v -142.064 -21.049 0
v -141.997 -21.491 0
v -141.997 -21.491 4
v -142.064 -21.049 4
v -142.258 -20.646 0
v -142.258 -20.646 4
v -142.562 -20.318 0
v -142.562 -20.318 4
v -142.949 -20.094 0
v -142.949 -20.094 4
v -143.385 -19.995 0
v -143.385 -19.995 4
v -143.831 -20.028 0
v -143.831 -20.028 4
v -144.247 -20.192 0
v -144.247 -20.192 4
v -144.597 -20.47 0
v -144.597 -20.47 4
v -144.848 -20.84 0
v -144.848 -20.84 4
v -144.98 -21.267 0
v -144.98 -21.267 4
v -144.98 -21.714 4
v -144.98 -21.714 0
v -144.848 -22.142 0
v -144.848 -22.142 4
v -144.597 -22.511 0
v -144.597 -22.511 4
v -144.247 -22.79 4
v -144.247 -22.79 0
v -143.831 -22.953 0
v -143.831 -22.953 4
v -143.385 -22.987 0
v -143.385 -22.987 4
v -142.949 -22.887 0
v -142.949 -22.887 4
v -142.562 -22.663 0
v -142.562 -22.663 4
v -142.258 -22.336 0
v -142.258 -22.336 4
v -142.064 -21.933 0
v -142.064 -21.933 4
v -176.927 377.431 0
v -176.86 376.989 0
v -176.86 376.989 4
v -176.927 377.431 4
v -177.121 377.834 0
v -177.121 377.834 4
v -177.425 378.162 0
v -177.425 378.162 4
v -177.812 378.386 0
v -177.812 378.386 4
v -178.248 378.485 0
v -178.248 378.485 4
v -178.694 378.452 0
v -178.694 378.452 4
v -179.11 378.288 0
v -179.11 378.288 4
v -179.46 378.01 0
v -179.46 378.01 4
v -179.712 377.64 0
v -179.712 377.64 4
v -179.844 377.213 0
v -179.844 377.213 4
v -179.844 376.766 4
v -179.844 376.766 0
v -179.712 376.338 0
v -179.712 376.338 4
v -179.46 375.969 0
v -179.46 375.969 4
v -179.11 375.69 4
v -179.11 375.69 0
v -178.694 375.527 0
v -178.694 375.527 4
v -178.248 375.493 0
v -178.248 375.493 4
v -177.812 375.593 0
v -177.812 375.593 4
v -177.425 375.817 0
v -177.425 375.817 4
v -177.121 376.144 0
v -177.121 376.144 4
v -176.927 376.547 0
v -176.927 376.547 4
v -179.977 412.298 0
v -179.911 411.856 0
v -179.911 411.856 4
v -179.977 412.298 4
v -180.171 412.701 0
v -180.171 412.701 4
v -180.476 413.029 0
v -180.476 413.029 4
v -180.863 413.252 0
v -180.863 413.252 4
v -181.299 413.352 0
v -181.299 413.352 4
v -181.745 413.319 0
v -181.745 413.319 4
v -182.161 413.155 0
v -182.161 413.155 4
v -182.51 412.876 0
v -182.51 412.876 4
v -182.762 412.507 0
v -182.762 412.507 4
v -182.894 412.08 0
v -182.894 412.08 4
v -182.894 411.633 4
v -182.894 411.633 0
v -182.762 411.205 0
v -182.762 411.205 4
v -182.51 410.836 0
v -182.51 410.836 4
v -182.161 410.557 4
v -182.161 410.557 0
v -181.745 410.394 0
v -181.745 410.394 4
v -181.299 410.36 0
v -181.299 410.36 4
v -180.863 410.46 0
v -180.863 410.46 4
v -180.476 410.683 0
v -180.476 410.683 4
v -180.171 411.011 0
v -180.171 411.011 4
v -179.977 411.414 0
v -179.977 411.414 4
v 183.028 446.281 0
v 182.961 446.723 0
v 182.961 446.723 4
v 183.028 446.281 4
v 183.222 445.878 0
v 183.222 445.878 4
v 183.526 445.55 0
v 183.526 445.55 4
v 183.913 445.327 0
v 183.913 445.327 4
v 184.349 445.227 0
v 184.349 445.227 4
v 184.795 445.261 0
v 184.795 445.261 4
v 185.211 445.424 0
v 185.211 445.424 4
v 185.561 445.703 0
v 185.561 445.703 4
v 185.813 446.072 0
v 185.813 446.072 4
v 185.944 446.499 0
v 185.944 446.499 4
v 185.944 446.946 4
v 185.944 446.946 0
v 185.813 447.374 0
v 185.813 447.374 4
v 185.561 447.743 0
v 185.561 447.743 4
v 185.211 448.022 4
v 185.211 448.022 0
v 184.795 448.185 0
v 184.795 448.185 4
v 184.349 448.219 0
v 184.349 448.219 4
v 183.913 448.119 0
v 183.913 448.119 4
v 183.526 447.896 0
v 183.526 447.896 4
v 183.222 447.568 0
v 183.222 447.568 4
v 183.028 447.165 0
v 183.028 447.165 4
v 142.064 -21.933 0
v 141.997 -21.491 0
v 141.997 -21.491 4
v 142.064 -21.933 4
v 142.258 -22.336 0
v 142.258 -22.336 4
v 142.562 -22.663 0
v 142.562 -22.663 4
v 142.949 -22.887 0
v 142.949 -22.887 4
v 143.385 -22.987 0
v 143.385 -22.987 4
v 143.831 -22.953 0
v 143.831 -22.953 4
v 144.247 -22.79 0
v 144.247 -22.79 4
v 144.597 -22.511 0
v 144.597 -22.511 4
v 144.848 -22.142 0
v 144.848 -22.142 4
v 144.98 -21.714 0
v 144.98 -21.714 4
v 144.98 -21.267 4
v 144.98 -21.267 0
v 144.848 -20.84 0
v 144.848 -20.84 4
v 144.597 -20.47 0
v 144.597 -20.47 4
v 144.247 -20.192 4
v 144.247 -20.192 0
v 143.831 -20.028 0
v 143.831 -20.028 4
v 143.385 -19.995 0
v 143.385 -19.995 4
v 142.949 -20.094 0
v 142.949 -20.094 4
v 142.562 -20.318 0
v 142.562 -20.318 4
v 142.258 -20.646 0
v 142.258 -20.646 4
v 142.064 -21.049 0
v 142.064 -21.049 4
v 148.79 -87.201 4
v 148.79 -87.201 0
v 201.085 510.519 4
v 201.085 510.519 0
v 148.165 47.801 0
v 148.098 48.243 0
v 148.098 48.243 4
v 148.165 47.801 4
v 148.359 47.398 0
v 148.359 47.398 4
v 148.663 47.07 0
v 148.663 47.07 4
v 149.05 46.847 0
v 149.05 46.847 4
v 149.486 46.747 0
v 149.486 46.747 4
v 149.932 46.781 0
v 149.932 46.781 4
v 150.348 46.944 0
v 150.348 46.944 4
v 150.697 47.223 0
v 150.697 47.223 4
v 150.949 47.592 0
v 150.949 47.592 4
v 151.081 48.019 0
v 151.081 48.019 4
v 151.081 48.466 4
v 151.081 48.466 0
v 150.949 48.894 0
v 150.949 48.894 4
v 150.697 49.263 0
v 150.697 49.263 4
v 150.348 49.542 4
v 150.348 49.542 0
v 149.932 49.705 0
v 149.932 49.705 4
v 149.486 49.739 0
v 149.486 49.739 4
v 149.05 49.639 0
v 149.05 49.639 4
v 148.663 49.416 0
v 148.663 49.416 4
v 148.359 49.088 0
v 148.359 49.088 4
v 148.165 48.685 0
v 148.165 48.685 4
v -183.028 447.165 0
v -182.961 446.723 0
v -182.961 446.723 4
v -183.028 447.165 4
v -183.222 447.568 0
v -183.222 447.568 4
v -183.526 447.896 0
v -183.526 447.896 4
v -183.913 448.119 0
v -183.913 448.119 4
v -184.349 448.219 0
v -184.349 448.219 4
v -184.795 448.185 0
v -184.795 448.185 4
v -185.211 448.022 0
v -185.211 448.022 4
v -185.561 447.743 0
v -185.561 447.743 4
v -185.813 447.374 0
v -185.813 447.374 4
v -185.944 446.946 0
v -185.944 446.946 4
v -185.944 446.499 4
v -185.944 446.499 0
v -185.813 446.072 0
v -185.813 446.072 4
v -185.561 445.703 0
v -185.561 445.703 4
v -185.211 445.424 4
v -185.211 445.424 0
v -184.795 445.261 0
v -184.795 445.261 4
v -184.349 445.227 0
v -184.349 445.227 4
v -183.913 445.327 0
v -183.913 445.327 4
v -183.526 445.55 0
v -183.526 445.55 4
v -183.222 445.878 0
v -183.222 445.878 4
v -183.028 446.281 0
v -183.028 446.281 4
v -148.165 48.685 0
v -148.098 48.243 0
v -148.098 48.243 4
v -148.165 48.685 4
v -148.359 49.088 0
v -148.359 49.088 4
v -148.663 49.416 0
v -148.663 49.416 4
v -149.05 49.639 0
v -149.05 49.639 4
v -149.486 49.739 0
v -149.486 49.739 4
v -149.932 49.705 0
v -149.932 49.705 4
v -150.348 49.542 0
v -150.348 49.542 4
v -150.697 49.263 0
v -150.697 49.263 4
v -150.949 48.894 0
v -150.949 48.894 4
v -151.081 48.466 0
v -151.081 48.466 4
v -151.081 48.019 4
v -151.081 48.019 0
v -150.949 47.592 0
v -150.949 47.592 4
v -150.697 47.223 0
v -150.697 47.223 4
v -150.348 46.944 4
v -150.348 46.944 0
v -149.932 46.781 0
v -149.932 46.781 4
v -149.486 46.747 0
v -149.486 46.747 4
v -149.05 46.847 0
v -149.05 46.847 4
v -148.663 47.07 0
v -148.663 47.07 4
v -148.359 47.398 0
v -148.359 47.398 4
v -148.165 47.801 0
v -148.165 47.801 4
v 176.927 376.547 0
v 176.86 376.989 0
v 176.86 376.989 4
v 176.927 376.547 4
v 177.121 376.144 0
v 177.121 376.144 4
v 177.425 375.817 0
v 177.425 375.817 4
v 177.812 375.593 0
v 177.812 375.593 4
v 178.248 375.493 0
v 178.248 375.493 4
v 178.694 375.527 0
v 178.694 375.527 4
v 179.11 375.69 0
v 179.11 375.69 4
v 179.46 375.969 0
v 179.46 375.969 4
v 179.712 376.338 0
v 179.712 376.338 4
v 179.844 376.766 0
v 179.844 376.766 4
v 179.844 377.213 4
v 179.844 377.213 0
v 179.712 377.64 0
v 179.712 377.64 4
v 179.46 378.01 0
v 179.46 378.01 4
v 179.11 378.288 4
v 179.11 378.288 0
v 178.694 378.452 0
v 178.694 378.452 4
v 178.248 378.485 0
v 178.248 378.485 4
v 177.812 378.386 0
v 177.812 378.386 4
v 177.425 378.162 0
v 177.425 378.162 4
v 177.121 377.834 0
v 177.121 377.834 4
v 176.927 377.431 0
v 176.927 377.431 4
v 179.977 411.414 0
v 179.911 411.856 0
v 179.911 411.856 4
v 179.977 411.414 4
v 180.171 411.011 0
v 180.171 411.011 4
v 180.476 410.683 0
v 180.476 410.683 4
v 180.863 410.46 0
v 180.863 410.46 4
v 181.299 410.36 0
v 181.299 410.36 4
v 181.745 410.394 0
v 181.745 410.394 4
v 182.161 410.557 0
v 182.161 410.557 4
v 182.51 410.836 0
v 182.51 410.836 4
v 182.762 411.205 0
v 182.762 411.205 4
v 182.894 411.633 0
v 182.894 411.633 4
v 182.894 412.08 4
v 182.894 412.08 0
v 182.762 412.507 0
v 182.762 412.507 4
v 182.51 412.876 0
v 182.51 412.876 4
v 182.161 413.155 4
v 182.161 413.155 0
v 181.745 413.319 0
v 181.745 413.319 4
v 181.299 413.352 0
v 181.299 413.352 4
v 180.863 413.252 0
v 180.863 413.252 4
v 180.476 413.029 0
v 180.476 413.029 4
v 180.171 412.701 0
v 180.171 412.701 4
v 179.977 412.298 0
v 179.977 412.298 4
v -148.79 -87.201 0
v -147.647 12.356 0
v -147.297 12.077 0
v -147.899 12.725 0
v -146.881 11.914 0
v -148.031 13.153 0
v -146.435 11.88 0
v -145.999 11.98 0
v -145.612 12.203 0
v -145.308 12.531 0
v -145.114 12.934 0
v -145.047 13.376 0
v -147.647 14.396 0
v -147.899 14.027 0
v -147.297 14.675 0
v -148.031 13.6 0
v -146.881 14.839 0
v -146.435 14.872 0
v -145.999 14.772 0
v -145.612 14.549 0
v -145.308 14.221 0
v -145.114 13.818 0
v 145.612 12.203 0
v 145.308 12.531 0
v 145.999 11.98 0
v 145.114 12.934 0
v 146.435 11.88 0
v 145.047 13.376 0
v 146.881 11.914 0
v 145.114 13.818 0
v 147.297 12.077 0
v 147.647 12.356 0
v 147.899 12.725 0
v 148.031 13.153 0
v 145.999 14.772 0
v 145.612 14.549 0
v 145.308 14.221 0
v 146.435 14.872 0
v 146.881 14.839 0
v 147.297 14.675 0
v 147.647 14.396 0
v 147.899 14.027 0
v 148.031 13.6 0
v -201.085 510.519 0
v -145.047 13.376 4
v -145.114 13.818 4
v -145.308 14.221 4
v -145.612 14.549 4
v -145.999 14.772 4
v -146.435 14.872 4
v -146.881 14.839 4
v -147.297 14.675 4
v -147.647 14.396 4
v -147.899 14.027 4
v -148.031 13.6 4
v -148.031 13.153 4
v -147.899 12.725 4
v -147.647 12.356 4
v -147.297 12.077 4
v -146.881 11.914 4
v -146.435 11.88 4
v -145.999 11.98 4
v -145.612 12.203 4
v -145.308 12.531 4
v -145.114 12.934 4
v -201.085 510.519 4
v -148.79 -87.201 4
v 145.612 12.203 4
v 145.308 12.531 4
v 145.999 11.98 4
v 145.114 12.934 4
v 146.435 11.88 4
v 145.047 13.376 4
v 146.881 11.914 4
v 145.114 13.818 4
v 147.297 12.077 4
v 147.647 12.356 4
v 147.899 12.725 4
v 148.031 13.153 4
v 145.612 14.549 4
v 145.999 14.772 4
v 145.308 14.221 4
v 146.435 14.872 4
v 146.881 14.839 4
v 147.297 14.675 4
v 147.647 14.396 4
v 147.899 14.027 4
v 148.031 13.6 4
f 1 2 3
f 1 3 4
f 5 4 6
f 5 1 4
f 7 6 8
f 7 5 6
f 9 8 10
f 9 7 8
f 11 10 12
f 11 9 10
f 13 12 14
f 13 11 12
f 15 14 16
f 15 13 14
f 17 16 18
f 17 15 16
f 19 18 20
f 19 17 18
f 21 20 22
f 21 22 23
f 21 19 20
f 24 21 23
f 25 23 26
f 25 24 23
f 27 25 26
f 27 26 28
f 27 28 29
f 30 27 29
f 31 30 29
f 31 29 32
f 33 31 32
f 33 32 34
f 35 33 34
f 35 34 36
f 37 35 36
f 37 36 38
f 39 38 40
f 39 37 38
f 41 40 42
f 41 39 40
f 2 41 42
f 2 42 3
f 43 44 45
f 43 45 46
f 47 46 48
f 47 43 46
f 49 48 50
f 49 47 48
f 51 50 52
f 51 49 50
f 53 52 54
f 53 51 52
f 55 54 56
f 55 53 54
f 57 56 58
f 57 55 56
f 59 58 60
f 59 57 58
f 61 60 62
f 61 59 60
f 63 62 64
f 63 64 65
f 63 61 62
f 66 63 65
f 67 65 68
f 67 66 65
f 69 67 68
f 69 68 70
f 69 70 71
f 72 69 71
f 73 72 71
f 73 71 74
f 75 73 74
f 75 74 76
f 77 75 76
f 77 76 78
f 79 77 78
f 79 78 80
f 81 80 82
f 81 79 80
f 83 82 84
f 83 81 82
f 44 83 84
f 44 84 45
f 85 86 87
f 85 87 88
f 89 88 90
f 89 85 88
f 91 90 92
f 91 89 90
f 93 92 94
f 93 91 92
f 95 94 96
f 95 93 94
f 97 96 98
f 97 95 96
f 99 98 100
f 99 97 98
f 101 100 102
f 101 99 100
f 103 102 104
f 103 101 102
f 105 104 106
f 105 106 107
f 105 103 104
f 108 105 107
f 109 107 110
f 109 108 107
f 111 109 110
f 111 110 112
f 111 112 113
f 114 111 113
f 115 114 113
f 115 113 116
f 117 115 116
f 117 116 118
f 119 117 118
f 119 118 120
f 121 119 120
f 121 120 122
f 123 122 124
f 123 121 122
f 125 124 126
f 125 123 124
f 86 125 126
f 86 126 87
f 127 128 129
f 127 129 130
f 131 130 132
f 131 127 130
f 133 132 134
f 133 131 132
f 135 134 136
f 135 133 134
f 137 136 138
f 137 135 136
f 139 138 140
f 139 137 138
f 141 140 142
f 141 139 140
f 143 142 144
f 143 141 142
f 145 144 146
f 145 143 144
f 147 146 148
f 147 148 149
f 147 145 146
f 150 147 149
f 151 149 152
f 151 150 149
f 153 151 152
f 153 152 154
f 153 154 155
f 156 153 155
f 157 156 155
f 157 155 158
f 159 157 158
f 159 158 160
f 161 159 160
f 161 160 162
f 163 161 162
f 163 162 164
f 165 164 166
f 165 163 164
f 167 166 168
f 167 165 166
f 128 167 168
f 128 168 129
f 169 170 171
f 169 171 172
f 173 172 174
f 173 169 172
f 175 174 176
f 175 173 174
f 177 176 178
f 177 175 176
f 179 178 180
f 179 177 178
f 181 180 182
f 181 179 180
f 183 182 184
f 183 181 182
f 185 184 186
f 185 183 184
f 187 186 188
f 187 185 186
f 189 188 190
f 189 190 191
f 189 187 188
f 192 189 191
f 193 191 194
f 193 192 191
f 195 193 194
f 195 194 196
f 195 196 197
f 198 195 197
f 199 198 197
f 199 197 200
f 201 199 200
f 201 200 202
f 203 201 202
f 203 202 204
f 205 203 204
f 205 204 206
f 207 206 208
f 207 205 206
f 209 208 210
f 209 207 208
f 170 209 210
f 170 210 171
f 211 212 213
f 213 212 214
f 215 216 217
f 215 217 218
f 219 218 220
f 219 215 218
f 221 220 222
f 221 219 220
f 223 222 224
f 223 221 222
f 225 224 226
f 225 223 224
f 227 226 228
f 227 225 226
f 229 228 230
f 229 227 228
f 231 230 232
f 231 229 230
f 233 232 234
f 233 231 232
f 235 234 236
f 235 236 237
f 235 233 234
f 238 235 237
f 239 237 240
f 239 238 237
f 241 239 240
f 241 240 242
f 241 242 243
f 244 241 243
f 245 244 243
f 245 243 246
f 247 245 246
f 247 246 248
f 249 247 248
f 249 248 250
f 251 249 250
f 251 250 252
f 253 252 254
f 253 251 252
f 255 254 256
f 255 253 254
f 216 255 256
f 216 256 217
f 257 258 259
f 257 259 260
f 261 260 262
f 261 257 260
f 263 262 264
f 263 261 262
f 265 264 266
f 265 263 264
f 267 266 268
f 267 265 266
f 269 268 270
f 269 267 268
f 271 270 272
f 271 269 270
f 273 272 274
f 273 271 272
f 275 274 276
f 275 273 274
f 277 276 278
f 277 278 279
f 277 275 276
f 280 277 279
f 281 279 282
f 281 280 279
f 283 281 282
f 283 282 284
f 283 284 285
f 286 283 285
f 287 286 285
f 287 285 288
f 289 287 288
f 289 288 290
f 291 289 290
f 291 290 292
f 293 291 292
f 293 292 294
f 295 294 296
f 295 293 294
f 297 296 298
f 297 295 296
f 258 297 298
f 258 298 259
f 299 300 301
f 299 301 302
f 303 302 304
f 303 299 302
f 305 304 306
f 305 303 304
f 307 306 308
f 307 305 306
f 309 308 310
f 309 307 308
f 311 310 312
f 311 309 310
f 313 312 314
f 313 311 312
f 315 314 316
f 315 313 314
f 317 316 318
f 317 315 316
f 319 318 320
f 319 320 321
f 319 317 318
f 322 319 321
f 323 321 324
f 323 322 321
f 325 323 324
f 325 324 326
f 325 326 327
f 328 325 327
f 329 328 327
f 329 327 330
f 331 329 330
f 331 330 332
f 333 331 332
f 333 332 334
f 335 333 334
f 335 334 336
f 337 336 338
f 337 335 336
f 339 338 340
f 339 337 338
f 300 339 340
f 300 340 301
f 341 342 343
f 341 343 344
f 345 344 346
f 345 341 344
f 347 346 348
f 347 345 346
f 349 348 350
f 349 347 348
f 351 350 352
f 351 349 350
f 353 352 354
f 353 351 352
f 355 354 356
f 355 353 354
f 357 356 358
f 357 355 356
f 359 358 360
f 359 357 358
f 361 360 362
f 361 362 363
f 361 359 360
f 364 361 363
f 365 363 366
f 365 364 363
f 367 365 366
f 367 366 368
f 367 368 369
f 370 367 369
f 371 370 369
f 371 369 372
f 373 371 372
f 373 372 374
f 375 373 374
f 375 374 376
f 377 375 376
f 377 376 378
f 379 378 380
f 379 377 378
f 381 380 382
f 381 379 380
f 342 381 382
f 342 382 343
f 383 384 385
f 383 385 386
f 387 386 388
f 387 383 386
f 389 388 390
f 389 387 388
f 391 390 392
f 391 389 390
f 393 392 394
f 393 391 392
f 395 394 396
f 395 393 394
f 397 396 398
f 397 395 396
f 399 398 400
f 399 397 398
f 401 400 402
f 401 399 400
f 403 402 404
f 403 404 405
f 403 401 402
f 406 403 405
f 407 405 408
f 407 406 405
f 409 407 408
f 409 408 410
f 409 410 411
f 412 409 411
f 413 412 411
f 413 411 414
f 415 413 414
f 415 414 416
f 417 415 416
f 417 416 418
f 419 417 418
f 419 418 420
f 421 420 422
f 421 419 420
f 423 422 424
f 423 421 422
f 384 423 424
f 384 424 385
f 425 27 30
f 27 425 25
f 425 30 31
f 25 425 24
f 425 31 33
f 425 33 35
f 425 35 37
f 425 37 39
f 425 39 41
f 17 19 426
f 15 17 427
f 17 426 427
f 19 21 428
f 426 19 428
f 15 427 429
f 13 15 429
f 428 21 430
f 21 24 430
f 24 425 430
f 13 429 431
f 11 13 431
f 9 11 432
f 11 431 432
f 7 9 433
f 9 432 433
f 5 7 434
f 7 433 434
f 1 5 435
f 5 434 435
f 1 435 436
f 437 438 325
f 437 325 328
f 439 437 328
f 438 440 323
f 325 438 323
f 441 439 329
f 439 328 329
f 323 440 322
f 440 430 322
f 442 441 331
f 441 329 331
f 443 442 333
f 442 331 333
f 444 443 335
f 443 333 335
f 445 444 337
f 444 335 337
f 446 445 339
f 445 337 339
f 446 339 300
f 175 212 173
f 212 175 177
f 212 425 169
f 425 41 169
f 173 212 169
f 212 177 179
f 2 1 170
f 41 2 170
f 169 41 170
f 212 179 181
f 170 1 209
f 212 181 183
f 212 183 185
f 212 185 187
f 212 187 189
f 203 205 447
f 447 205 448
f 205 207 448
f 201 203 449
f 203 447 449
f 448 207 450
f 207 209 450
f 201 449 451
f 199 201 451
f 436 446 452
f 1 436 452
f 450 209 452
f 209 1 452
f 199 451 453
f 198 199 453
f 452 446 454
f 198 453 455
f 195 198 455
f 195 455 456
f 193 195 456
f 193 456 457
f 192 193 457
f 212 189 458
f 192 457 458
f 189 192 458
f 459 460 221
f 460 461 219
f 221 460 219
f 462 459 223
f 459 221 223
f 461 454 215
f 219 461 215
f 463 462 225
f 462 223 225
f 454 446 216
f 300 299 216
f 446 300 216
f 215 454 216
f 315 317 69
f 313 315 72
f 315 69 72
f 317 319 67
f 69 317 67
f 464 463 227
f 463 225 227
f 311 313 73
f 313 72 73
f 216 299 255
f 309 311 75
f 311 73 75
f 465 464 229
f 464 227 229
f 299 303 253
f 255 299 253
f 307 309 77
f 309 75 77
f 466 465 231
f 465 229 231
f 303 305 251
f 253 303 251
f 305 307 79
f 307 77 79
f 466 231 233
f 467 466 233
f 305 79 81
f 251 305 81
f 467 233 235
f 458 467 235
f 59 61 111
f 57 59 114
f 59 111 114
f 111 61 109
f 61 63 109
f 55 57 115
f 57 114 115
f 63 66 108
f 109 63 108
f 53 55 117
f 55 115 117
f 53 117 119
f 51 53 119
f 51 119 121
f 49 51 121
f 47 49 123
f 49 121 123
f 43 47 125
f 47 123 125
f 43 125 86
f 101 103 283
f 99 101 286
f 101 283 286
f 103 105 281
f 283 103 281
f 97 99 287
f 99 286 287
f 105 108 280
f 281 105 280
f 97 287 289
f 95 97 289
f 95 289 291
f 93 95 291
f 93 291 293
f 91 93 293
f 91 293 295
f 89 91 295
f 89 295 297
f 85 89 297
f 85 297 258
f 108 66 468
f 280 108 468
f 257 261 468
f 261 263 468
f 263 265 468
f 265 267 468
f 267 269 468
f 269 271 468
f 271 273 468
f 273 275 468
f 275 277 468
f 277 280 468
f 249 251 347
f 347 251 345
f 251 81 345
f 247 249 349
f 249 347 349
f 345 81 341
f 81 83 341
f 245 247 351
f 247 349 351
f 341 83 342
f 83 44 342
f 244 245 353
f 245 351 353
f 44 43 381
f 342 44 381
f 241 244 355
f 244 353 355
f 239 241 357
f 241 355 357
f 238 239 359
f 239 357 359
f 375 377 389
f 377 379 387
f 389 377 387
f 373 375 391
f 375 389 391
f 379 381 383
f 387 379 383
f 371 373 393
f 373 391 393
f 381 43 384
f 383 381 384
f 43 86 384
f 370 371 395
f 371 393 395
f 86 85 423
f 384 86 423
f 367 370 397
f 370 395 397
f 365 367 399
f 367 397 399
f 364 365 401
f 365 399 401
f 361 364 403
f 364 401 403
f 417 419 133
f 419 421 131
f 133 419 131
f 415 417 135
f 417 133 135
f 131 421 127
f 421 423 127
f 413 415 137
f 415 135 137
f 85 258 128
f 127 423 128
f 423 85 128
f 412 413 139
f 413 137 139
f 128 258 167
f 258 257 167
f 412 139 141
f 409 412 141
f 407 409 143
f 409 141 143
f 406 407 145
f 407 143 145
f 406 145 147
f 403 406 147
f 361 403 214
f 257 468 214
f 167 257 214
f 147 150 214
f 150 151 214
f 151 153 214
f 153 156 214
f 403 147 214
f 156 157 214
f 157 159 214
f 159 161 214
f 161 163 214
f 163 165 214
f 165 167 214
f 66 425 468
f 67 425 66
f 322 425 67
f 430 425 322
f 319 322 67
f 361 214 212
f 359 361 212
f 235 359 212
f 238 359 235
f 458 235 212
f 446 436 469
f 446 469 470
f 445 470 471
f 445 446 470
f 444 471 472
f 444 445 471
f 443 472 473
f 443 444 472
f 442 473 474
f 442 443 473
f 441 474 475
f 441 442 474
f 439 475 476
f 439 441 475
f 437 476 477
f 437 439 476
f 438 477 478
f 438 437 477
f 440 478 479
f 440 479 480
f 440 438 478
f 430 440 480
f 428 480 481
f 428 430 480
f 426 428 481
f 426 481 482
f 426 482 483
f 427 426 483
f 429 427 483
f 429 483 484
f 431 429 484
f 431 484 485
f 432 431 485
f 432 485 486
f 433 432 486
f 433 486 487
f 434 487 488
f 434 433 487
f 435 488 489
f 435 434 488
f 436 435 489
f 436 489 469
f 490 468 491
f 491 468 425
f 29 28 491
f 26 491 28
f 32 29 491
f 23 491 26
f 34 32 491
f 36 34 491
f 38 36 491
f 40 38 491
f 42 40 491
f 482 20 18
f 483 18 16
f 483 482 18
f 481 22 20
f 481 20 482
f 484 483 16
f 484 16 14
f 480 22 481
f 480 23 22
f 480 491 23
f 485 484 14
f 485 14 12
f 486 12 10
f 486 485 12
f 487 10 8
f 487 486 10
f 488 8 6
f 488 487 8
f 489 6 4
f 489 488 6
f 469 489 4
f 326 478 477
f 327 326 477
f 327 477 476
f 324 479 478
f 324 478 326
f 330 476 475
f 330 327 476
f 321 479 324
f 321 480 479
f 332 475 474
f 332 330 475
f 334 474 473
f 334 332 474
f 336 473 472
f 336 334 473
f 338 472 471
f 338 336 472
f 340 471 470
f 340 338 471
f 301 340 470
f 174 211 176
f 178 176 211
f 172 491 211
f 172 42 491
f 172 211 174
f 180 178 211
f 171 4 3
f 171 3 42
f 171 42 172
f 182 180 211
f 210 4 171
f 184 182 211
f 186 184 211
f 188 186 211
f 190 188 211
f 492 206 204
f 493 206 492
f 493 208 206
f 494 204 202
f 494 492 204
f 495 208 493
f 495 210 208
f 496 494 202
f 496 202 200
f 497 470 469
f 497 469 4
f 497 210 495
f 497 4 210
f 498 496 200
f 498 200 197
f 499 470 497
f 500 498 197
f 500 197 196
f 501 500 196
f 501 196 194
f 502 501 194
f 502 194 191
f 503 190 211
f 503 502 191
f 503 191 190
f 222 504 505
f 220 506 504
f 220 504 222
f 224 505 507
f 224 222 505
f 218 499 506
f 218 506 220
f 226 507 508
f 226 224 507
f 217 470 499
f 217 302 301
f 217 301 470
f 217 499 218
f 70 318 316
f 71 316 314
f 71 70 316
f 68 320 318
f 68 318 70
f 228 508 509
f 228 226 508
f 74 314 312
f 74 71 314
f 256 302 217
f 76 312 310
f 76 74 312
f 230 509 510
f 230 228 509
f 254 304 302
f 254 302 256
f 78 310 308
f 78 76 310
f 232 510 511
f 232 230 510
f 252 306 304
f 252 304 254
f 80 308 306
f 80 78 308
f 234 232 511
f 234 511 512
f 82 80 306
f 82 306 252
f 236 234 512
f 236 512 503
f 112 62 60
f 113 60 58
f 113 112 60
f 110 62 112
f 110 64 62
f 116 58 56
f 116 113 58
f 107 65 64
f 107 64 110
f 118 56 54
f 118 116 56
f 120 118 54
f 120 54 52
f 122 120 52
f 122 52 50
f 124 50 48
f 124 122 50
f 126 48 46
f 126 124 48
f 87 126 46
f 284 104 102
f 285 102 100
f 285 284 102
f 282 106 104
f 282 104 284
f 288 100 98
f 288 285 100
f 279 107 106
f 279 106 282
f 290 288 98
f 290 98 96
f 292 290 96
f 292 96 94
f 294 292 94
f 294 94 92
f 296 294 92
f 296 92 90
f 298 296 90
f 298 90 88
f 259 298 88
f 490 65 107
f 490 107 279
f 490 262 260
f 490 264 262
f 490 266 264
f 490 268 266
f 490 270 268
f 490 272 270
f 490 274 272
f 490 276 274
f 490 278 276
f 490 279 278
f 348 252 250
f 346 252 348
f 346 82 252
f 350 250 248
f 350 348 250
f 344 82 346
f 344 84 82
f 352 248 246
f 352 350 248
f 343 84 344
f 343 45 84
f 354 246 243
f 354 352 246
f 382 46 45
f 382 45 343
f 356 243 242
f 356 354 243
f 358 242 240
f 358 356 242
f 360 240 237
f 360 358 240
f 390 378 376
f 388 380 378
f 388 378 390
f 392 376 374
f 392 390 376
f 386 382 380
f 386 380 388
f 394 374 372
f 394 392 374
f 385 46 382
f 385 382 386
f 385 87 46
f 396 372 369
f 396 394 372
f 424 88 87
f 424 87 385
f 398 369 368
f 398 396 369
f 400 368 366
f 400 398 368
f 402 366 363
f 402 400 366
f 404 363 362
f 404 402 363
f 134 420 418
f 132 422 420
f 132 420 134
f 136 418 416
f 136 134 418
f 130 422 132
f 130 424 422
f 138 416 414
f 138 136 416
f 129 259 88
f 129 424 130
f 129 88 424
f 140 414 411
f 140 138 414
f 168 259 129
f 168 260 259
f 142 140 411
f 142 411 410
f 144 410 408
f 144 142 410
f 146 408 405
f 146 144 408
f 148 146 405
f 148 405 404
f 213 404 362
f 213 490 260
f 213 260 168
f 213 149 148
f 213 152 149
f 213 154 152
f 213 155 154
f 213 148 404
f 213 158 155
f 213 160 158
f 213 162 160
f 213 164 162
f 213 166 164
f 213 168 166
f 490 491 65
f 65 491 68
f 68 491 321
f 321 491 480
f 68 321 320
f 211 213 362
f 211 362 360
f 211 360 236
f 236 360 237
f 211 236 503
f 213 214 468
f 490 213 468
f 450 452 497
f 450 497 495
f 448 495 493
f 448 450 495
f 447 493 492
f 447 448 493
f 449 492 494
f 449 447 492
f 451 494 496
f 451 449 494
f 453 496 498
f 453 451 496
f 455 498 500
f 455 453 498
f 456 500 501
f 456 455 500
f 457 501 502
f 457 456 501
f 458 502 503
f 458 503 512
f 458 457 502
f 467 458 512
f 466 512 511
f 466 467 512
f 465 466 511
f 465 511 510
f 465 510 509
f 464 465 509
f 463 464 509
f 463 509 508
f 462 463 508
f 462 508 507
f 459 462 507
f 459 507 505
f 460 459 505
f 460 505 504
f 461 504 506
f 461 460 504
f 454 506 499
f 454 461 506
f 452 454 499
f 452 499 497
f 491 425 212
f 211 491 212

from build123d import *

# Parameters (mm, degrees)
SKETCH2_R           = 1.5
BOSS_EXTRUDE1_DEPTH = 4


with BuildPart() as part:
    # Sketch2 → Boss-Extrude1 (new body)
    with BuildSketch(Plane.XY):
        Polygon((-201.085, 510.519303279), (-148.79, -87.200696721), (148.79, -87.200696721), (201.085, 510.519303279), align=None)
        with Locations((-143.497000101, -21.490696721)):
            Circle(SKETCH2_R, mode=Mode.SUBTRACT)
        with Locations((-146.547451097, 13.376117712)):
            Circle(SKETCH2_R, mode=Mode.SUBTRACT)
        with Locations((-149.597902093, 48.242932145)):
            Circle(SKETCH2_R, mode=Mode.SUBTRACT)
        with Locations((-178.360333434, 376.989303279)):
            Circle(SKETCH2_R, mode=Mode.SUBTRACT)
        with Locations((-181.410784431, 411.856117712)):
            Circle(SKETCH2_R, mode=Mode.SUBTRACT)
        with Locations((-184.461235427, 446.722932145)):
            Circle(SKETCH2_R, mode=Mode.SUBTRACT)
        with Locations(Location((143.497000101, -21.490696721, 0), (0, 0, 180))):
            Circle(SKETCH2_R, mode=Mode.SUBTRACT)
        with Locations(Location((146.547451097, 13.376117712, 0), (0, 0, 180))):
            Circle(SKETCH2_R, mode=Mode.SUBTRACT)
        with Locations(Location((149.597902093, 48.242932145, 0), (0, 0, 180))):
            Circle(SKETCH2_R, mode=Mode.SUBTRACT)
        with Locations(Location((178.360333434, 376.989303279, 0), (0, 0, 180))):
            Circle(SKETCH2_R, mode=Mode.SUBTRACT)
        with Locations(Location((181.410784431, 411.856117712, 0), (0, 0, 180))):
            Circle(SKETCH2_R, mode=Mode.SUBTRACT)
        with Locations(Location((184.461235427, 446.722932145, 0), (0, 0, 180))):
            Circle(SKETCH2_R, mode=Mode.SUBTRACT)
    extrude(amount=BOSS_EXTRUDE1_DEPTH)


solid = part.part
